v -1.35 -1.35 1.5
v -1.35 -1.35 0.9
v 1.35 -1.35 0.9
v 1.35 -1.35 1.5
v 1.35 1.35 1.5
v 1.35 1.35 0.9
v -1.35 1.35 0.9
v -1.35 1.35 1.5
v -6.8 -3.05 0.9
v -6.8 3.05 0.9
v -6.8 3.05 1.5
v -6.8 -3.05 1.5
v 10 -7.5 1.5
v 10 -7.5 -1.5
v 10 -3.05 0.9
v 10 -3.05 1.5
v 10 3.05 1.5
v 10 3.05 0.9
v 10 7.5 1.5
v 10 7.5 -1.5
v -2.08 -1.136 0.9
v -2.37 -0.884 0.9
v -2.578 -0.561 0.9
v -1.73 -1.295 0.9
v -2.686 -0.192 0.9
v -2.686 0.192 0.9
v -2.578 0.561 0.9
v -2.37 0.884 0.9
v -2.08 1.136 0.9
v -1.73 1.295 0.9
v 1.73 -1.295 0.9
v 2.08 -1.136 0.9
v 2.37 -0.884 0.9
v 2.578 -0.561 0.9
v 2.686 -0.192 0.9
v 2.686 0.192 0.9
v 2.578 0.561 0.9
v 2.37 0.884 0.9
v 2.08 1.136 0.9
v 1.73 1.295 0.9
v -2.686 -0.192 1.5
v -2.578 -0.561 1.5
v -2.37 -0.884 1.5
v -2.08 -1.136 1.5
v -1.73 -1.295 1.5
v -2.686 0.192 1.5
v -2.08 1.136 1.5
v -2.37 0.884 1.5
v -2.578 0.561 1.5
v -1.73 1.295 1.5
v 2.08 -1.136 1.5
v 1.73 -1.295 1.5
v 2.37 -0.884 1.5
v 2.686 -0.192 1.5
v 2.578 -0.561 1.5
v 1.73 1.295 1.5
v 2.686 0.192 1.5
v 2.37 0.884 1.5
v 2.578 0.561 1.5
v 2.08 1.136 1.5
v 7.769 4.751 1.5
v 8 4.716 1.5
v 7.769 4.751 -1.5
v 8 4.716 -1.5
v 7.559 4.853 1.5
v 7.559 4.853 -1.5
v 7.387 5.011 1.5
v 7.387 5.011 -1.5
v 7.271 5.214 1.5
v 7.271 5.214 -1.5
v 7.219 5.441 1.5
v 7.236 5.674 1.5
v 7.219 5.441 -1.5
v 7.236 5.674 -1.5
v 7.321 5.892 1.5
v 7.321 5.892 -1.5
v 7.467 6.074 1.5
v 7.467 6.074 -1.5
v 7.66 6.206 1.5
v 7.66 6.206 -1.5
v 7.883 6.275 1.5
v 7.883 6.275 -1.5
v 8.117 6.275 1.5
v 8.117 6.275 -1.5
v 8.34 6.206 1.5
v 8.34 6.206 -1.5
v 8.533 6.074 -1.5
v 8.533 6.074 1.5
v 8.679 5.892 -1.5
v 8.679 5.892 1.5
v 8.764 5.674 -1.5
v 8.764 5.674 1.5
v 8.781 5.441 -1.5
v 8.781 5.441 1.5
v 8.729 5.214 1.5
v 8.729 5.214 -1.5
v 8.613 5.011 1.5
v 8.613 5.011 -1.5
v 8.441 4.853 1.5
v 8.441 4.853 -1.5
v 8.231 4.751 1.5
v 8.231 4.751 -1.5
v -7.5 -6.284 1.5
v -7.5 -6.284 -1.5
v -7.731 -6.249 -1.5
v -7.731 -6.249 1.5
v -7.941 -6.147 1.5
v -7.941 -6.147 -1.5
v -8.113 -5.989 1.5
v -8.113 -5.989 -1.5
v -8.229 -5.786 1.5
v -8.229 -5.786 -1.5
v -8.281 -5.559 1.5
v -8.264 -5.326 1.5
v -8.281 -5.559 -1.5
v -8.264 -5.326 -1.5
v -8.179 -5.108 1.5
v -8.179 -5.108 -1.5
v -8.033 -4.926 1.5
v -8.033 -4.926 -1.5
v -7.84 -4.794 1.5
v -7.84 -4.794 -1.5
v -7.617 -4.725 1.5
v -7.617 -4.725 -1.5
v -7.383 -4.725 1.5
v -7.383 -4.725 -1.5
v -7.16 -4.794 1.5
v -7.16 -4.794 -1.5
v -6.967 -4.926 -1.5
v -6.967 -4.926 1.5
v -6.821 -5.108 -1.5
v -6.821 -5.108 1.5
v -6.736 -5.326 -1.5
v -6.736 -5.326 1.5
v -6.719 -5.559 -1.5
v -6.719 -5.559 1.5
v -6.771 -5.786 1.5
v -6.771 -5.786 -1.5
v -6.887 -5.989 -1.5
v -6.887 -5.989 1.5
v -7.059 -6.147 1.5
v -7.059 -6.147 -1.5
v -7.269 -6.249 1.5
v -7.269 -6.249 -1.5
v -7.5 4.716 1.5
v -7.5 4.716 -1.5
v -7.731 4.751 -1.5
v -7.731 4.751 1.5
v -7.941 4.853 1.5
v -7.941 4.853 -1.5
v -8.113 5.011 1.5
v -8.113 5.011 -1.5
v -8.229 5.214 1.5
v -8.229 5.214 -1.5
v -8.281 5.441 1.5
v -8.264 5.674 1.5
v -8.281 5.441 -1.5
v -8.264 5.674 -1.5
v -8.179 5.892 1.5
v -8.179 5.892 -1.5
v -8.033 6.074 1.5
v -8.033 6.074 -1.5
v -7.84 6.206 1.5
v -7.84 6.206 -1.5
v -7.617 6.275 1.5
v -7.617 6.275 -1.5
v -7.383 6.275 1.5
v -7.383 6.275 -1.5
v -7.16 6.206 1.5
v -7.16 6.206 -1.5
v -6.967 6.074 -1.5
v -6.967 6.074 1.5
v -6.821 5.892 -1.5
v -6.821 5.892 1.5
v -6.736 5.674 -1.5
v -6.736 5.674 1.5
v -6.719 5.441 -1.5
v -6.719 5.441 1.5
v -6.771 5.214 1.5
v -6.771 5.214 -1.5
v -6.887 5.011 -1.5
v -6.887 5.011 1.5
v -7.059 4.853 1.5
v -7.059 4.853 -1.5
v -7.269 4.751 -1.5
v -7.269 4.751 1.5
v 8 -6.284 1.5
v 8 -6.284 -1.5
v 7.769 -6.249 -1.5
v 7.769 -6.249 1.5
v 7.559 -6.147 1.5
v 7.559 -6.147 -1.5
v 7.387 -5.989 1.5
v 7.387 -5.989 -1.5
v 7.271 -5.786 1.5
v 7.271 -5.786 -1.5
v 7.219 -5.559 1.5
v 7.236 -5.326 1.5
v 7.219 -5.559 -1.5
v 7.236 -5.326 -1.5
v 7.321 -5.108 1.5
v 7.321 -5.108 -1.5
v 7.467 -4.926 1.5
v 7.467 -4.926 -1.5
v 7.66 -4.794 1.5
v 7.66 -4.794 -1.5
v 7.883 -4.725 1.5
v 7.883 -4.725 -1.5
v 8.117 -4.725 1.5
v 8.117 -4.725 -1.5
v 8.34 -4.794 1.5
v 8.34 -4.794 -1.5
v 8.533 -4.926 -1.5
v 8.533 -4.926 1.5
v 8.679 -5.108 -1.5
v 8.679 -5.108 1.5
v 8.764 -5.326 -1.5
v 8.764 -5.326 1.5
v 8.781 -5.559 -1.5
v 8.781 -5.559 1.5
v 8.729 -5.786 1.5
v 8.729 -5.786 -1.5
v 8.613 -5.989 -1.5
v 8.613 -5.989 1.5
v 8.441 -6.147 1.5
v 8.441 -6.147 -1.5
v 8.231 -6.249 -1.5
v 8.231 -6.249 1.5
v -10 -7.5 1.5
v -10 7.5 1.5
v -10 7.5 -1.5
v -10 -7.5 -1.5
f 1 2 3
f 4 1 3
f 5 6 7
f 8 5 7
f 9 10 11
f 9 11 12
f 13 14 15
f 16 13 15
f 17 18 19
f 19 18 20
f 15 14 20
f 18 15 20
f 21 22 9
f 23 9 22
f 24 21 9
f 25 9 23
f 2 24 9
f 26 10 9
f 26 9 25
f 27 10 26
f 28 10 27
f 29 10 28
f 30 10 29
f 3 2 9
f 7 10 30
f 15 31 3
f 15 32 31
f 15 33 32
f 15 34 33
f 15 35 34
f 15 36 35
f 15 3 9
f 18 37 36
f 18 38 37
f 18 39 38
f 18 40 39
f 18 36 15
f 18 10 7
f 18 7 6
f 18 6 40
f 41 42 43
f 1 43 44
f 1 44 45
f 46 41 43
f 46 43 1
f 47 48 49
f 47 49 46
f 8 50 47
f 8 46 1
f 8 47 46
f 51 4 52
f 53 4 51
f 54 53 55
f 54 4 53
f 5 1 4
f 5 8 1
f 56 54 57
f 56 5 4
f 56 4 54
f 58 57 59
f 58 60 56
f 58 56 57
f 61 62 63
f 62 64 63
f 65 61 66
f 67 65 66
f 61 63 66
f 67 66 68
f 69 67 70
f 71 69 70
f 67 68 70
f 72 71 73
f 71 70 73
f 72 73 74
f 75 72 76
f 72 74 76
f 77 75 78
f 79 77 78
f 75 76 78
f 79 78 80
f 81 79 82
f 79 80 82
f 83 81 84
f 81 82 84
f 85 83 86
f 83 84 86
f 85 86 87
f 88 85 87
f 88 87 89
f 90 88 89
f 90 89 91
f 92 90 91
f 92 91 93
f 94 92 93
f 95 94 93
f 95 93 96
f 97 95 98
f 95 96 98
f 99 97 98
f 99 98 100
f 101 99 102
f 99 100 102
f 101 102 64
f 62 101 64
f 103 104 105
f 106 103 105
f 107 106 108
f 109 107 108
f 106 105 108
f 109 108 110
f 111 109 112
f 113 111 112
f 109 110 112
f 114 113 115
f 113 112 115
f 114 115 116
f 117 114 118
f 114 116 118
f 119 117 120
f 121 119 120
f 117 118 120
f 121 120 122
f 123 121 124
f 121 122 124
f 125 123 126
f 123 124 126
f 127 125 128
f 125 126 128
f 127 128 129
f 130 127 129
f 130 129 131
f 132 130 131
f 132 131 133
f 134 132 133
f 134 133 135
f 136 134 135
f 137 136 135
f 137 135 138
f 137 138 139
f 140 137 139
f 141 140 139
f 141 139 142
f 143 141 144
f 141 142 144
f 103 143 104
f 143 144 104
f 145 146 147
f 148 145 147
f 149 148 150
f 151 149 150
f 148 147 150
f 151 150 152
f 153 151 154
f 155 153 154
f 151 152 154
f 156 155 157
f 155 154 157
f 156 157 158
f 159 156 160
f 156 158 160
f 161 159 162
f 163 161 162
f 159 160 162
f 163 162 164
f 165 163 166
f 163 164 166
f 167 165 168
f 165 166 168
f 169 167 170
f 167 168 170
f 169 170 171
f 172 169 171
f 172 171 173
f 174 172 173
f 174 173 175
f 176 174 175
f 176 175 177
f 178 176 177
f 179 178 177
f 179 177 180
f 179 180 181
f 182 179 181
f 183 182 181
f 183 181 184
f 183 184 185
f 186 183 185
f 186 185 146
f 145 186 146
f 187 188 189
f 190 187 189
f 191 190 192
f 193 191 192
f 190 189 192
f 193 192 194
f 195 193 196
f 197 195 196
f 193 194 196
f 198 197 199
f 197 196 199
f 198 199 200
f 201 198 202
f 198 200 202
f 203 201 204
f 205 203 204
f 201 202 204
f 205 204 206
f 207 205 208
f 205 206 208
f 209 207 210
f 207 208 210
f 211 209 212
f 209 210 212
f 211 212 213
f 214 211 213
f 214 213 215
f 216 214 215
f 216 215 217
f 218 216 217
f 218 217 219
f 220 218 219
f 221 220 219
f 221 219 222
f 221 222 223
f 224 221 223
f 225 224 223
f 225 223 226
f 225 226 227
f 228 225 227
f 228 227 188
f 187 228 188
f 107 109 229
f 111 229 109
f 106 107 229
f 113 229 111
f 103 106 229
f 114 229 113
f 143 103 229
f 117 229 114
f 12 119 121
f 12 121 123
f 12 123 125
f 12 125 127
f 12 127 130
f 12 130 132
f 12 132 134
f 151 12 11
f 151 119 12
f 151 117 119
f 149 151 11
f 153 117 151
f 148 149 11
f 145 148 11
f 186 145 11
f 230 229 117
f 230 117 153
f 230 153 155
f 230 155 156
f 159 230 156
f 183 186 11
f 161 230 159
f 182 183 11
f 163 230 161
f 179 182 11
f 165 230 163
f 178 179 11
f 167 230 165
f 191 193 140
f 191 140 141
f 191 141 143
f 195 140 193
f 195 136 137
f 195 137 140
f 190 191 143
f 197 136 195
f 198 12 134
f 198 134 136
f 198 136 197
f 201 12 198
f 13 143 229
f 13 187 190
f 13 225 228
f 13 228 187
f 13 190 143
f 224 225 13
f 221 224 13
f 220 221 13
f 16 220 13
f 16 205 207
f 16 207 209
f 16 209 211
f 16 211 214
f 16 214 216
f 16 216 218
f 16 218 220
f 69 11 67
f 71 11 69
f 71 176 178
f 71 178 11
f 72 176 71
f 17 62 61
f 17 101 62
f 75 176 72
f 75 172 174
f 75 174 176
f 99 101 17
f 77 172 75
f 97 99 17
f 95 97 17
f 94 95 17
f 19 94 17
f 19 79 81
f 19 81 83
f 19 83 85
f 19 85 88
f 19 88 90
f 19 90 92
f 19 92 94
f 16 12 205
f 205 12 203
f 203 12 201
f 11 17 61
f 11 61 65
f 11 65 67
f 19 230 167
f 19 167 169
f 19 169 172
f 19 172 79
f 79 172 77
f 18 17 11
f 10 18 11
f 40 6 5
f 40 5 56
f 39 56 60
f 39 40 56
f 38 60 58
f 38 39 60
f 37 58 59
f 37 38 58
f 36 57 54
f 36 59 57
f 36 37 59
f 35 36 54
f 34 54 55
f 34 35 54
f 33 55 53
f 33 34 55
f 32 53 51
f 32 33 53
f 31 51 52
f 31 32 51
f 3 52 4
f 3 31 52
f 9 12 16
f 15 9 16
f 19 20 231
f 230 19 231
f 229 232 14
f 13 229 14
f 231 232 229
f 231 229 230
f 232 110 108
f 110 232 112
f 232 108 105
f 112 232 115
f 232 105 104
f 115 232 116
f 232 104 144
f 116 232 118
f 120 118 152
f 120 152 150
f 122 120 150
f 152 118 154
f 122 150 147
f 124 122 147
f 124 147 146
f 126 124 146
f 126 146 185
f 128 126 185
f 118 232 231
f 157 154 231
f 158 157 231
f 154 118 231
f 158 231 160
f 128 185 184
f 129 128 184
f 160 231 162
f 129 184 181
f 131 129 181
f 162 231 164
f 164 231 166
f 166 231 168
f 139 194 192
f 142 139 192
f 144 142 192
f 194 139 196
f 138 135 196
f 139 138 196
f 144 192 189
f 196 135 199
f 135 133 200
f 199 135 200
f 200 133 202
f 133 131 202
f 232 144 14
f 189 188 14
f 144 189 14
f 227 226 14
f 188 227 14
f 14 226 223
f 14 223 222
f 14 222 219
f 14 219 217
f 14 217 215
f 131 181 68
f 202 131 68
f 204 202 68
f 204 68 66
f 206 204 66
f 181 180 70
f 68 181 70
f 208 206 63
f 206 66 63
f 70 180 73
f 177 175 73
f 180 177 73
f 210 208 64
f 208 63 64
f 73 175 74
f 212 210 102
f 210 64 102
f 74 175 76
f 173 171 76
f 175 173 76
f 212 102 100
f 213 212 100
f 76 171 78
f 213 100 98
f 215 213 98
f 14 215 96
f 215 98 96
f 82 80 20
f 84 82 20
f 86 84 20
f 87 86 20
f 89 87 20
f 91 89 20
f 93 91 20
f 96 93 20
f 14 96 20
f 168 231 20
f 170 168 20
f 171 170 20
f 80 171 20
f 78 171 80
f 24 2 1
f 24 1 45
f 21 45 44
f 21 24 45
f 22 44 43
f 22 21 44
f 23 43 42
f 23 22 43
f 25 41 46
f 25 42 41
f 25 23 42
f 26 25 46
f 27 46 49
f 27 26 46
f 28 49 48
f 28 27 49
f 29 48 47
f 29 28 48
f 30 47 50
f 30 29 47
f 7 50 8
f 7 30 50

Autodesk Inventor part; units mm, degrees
ref_plane "YZ Plane" through (0, 0, 0) normal (1, 0, 0) x (0, 1, 0)
ref_plane "XZ Plane" through (0, 0, 0) normal (0, 1, 0) x (-1, 0, 0)
ref_plane "XY Plane" through (0, 0, 0) normal (0, 0, 1) x (1, 0, 0)
sketch "スケッチ1" plane through (0, 0, 0) normal (0, 0, 1) x (1, 0, 0)
  line L0 (-10, -7.5) -> (10, -7.5)
  line L1 (10, -7.5) -> (10, 7.5)
  line L2 (10, 7.5) -> (-10, 7.5)
  line L3 (-10, 7.5) -> (-10, -7.5)
  line L4 (-10, -7.5) -> (10, 7.5) construction
  line L5 (10, -7.5) -> (-10, 7.5) construction
  point P0 (0, 0)
  dimension "d0" = 20
  dimension "d1" = 15
extrude "押し出し1" add sketch "スケッチ1" along normal mid plane 3
sketch "スケッチ2" plane through (0, 0, 1.5) normal (0, 0, 1) x (1, 0, 0)
  line L0 (10, -7.5) -> (10, 7.5) projected
  line L1 (-10, -3.05) -> (10, -3.05)
  line L2 (10, -3.05) -> (10, 3.05)
  line L3 (10, 3.05) -> (-10, 3.05)
  line L4 (-10, 3.05) -> (-10, -3.05)
  line L5 (-10, -3.05) -> (10, 3.05) construction
  line L6 (10, -3.05) -> (-10, 3.05) construction
  point P0 (0, 0)
  dimension "d4" = 6.1
extrude "押し出し2" cut sketch "スケッチ2" against normal blind 0.6
sketch "スケッチ3" plane through (0, 0, 0.9) normal (0, 0, 1) x (1, 0, 0)
  line L0 (-1.35, 0) -> (1.35, 0) construction
  line L1 (-1.35, -1.35) -> (1.35, -1.35)
  line L2 (1.35, 1.35) -> (-1.35, 1.35)
  arc A0 (-1.35, 1.35) -> (-1.35, -1.35) centre (-1.35, 0) ccw
  arc A1 (1.35, -1.35) -> (1.35, 1.35) centre (1.35, 0) ccw
  point P0 (0, 0)
  point P1 (2.7, 0)
  point P2 (-2.7, 0)
  dimension "d7" = 2.7
  dimension "d8" = 5.4
extrude "押し出し3" add sketch "スケッチ3" along normal blind 0.6
sketch "スケッチ4" plane through (0, 0, 0.9) normal (0, 0, 1) x (1, 0, 0)
  line L0 (1.35, -1.35) -> (-1.35, -1.35) projected
  arc A0 (-1.35, 1.35) -> (-1.35, -1.35) centre (-1.35, 0) ccw projected
  line L1 (-1.35, 1.35) -> (1.35, 1.35) projected
  arc A1 (1.35, -1.35) -> (1.35, 1.35) centre (1.35, 0) ccw projected
  line L2 (10, -3.05) -> (-10, -3.05) projected
  line L3 (10, 3.05) -> (10, -3.05) projected
  line L4 (-10, 3.05) -> (10, 3.05) projected
  line L5 (-10, -3.05) -> (-10, 3.05) projected
  line L6 (-10, 3.05) -> (10, 3.05) projected
  line L7 (-6.8, 3.05) -> (-6.8, -3.05)
  arc A2 (-1.35, 1.35) -> (-1.35, -1.35) centre (-1.35, 0) ccw projected
  point P0 (0, 0)
  point P1 (-2.7, 0)
  dimension "d11" = 4.1
extrude "押し出し4" add sketch "スケッチ4" along normal blind 0.6 contours L2 L5 L4 L7
sketch "スケッチ5" plane through (0, 0, 1.5) normal (0, 0, 1) x (1, 0, 0)
  line L0 (0, 0) -> (2.6024, 0)
  point P0 (-7.5, 5.5)
  point P1 (8, 5.5)
  point P2 (-7.5, -5.5)
  point P3 (8, -5.5)
  dimension "d14" = 5.5
  dimension "d15" = 5.5
  dimension "d16" = 8
  dimension "d17" = 7.5
hole "穴1" at (-7.5, 5.5, 1.5) at (8, 5.5, 1.5) at (-7.5, -5.5, 1.5) at (8, -5.5, 1.5) direction (0, 0, -1) diameter 1.567 end through all thread size "M2x0.4" class "6H" standard "ISO Metric profile"
equation "\"d15\" = d14"
properties part number "cutter_holder"
